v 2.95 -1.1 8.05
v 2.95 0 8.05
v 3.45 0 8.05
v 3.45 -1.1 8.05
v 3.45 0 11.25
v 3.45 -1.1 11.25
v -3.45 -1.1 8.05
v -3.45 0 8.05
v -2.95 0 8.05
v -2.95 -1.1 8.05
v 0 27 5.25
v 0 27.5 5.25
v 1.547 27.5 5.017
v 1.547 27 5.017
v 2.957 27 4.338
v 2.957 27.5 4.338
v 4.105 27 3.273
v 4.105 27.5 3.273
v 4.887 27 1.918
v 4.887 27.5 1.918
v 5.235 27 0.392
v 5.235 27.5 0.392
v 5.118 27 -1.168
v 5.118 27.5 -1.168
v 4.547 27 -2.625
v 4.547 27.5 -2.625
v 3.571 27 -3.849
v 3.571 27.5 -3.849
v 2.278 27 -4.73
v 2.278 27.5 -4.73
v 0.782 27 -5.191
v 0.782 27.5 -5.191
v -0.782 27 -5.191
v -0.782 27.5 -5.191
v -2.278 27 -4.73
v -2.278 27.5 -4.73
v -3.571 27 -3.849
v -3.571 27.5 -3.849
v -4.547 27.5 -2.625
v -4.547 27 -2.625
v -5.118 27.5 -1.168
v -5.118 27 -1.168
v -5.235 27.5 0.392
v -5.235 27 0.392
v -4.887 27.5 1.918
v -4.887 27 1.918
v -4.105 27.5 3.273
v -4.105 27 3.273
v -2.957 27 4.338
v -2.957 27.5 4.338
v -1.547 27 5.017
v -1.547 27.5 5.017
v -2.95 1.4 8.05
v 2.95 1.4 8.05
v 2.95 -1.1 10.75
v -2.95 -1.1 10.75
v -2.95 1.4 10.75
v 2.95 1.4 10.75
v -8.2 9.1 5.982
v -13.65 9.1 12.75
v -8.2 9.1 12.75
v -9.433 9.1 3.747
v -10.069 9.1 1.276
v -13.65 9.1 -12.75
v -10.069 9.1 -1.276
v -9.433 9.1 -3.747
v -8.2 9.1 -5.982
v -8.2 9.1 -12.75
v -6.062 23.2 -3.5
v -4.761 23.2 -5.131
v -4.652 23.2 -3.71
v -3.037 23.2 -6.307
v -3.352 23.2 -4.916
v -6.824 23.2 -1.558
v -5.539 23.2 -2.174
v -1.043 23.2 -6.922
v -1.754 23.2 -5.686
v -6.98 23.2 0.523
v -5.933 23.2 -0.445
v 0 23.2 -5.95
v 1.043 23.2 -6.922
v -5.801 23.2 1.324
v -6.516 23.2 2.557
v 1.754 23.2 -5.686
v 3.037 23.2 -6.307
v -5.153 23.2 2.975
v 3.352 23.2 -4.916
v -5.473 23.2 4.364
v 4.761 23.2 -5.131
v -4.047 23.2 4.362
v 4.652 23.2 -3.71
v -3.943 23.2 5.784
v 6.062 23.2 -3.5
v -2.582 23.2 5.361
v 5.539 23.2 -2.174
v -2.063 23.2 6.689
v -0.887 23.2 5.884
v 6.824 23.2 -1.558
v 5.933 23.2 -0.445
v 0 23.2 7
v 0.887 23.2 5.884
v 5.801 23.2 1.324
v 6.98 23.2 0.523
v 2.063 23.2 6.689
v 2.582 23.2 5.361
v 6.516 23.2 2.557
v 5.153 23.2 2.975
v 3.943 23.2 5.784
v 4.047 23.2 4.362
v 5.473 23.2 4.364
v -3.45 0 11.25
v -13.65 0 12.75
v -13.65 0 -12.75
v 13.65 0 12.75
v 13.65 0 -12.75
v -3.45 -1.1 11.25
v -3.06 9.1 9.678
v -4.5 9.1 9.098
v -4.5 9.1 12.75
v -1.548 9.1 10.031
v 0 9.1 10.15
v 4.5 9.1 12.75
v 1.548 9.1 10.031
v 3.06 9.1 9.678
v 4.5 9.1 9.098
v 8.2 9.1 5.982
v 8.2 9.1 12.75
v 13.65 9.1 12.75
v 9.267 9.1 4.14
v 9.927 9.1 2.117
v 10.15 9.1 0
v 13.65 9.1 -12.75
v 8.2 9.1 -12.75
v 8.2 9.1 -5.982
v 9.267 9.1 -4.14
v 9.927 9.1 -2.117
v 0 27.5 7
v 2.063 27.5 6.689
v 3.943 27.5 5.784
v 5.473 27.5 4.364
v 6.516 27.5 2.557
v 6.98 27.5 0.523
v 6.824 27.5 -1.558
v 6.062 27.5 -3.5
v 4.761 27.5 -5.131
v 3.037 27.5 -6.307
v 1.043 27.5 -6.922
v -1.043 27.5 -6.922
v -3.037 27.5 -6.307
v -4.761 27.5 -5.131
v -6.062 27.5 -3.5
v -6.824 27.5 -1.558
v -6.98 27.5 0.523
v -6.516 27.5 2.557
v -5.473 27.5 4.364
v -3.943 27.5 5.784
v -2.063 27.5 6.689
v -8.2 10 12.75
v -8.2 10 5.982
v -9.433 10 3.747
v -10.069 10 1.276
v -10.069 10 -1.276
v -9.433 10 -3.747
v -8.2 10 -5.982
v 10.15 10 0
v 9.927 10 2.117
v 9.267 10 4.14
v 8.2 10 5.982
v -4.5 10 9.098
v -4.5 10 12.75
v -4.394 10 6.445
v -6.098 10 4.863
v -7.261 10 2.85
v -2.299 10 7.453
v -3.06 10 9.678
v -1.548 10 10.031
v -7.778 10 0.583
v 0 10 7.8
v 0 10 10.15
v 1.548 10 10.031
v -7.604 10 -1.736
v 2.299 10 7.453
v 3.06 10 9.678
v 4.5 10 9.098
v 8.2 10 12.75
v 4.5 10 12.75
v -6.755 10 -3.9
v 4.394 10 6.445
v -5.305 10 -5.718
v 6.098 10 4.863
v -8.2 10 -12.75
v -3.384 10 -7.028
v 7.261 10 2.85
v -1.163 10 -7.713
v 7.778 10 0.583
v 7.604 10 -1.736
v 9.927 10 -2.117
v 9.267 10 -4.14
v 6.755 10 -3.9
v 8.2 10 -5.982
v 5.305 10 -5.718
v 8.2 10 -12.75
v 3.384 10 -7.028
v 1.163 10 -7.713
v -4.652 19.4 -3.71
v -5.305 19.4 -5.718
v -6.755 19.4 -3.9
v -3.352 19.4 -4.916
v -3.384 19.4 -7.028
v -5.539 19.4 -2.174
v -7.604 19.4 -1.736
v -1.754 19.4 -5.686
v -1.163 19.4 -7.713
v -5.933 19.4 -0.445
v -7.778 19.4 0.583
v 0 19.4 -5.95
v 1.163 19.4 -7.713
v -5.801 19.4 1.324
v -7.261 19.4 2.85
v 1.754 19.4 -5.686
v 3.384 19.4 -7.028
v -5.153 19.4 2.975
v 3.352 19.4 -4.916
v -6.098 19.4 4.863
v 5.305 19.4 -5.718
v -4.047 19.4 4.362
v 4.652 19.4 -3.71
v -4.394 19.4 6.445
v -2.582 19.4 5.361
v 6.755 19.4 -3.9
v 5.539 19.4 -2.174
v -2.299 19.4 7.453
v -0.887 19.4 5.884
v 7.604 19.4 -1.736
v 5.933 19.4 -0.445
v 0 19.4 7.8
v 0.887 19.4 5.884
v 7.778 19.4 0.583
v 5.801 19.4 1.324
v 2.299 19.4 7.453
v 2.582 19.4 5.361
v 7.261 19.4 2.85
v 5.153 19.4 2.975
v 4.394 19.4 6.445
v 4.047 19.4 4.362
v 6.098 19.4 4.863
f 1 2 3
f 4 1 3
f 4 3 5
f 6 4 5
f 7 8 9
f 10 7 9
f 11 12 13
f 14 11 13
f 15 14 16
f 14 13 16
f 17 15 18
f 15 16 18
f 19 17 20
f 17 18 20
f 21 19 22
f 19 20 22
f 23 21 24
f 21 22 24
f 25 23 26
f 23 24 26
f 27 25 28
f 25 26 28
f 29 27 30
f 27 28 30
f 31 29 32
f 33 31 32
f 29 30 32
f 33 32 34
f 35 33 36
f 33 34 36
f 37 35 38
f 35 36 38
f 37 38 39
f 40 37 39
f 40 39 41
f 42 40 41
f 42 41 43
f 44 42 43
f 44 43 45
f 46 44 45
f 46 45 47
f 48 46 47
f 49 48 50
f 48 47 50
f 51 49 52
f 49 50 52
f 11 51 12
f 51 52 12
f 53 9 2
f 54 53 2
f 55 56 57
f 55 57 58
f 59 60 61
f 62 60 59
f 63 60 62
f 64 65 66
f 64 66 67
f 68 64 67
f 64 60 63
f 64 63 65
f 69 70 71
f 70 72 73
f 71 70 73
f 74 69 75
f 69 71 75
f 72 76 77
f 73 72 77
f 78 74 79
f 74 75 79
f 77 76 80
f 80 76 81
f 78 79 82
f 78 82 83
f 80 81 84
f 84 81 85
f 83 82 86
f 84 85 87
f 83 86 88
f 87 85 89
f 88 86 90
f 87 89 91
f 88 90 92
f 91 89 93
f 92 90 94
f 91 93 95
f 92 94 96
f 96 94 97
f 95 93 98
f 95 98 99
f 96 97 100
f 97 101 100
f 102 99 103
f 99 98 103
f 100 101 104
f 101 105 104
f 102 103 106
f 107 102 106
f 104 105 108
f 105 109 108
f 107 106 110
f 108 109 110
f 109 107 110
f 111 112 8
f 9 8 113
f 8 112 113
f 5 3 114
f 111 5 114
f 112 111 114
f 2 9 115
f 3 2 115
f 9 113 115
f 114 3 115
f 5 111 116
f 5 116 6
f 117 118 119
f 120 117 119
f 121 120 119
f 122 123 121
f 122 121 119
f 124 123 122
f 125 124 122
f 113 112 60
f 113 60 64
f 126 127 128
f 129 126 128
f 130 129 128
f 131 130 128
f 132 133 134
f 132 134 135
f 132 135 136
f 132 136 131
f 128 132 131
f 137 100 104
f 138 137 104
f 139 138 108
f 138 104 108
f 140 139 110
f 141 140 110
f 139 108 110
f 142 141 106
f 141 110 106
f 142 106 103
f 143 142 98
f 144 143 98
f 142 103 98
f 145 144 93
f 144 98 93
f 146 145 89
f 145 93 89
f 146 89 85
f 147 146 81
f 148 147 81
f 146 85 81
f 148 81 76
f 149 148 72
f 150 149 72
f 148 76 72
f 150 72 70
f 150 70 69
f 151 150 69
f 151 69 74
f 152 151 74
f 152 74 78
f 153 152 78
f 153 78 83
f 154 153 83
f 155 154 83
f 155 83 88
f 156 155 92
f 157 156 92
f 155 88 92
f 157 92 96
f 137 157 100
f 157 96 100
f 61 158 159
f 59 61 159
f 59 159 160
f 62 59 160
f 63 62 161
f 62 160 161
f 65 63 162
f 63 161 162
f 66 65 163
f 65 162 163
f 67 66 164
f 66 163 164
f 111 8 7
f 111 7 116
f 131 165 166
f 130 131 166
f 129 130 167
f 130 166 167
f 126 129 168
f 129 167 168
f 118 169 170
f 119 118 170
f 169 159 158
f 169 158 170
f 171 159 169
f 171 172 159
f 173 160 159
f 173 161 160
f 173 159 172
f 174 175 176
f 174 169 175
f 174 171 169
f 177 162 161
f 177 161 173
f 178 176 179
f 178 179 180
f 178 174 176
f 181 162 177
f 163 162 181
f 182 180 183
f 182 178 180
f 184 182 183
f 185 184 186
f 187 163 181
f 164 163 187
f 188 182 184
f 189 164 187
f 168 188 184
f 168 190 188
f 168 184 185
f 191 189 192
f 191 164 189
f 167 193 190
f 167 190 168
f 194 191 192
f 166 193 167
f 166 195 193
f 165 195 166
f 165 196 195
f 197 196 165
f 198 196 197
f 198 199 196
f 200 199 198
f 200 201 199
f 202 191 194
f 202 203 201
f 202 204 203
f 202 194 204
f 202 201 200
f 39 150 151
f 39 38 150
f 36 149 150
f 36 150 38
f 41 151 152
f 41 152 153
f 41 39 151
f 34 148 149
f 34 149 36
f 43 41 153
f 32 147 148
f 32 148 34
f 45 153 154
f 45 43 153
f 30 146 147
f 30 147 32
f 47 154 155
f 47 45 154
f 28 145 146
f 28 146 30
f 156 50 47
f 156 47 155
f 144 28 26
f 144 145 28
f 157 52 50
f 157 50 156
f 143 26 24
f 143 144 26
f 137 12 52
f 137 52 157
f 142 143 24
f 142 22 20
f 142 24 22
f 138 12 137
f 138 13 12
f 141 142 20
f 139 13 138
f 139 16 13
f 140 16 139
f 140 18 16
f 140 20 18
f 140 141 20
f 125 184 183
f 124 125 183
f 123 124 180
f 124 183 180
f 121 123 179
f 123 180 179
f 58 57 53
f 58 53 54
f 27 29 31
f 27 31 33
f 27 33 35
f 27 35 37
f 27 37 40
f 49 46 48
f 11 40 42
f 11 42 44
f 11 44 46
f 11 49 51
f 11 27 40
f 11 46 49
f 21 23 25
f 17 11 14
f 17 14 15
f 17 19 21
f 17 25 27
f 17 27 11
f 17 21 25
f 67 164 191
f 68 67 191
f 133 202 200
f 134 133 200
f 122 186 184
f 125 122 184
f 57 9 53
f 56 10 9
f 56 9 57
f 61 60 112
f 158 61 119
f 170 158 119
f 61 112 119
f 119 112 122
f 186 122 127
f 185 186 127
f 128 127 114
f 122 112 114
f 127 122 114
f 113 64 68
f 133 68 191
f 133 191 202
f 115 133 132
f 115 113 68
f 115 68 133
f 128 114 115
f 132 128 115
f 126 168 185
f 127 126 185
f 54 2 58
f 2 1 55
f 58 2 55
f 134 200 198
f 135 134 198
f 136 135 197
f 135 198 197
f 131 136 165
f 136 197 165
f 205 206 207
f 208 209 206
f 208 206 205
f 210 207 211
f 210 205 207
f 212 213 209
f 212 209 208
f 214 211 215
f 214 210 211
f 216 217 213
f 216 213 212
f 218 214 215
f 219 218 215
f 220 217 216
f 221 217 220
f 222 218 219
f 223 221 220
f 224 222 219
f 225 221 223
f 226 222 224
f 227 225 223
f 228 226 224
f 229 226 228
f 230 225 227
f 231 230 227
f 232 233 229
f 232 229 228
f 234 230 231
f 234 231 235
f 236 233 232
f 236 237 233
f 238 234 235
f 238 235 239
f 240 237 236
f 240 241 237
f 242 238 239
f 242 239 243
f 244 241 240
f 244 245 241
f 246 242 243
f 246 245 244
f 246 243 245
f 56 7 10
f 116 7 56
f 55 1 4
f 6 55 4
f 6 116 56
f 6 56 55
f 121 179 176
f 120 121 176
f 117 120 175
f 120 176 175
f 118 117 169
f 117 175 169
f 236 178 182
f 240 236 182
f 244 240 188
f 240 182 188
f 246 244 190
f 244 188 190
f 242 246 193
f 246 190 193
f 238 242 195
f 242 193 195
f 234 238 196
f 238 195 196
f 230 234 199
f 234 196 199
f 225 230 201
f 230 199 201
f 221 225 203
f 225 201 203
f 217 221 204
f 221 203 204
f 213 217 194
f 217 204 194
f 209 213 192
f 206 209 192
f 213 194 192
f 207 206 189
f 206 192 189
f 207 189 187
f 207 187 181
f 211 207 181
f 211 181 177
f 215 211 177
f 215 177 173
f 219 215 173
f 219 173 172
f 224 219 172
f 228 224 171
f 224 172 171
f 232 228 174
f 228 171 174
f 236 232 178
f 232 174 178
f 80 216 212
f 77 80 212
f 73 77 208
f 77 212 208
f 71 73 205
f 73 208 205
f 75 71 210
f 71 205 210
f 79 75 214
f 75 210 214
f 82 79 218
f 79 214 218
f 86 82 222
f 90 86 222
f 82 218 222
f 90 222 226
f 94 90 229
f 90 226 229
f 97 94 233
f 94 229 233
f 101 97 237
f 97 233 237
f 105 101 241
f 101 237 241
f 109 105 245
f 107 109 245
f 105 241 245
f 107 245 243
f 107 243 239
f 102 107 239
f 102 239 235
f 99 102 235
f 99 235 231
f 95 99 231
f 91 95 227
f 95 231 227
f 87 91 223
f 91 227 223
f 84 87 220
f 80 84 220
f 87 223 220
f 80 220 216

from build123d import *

# Parameters (mm, degrees)
SKETCH1_W           = 27.3
SKETCH1_H           = 25.5
BOSS_EXTRUDE1_DEPTH = 10
CUT_EXTRUDE1_DEPTH  = 0.9
SKETCH3_R           = 7.8
BOSS_EXTRUDE2_DEPTH = 9.4
SKETCH4_R           = 5.95
BOSS_EXTRUDE3_DEPTH = 3.8
SKETCH5_R           = 7
BOSS_EXTRUDE4_DEPTH = 4.3
SKETCH6_R           = 5.25
CUT_EXTRUDE2_DEPTH  = 0.5
SKETCH7_W           = 6.9
SKETCH7_H           = 3.2
BOSS_EXTRUDE5_DEPTH = 1.1
SKETCH8_W           = 5.9
SKETCH8_H           = 2.7
CUT_EXTRUDE3_DEPTH  = 2.5


with BuildPart() as part:
    # Sketch1 → Boss-Extrude1 (new body)
    with BuildSketch(Plane(origin=(0, 0, 0), x_dir=(1, 0, 0), z_dir=(0, 1, 0))):
        Rectangle(SKETCH1_W, SKETCH1_H)
    extrude(amount=BOSS_EXTRUDE1_DEPTH)

    # Sketch2 → Cut-Extrude1 (cut)
    with BuildSketch(Plane(origin=(0, 10, 0), x_dir=(1, 0, 0), z_dir=(0, 1, 0))):
        with BuildLine():
            Line((-8.2, 5.981847541), (-8.2, 12.75))
            Line((-8.2, 12.75), (-13.65, 12.75))
            Line((-13.65, 12.75), (-13.65, -12.75))
            Line((-13.65, -12.75), (-8.2, -12.75))
            Line((-8.2, -12.75), (-8.2, -5.981847541))
            ThreePointArc((-8.2, -5.981847541), (-10.15, 0), (-8.2, 5.981847541))
        make_face()
        with BuildLine():
            Line((13.65, 12.75), (8.2, 12.75))
            Line((8.2, 12.75), (8.2, 5.981847541))
            ThreePointArc((8.2, 5.981847541), (9.650194299, 3.145830574), (10.15, 0))
            ThreePointArc((10.15, 0), (9.650194299, -3.145830574), (8.2, -5.981847541))
            Line((8.2, -5.981847541), (8.2, -12.75))
            Line((8.2, -12.75), (13.65, -12.75))
            Line((13.65, -12.75), (13.65, 12.75))
        make_face()
        with BuildLine():
            ThreePointArc((0, -10.15), (-2.310672611, -9.883485827), (-4.5, -9.097939327))
            Line((-4.5, -9.097939327), (-4.5, -12.75))
            Line((-4.5, -12.75), (0, -12.75))
            Line((0, -12.75), (0, -10.15))
        make_face()
        with BuildLine():
            ThreePointArc((4.5, -9.097939327), (2.310672611, -9.883485827), (0, -10.15))
            Line((0, -10.15), (0, -12.75))
            Line((0, -12.75), (4.5, -12.75))
            Line((4.5, -12.75), (4.5, -9.097939327))
        make_face()
    extrude(amount=-CUT_EXTRUDE1_DEPTH, mode=Mode.SUBTRACT)

    # Sketch3 → Boss-Extrude2 (add)
    with BuildSketch(Plane(origin=(0, 10, 0), x_dir=(1, 0, 0), z_dir=(0, 1, 0))):
        with Locations(Location((0, 0, 0), (0, 0, 270))):
            Circle(SKETCH3_R)
    extrude(amount=BOSS_EXTRUDE2_DEPTH)

    # Sketch4 → Boss-Extrude3 (add)
    with BuildSketch(Plane(origin=(0, 19.4, 0), x_dir=(1, 0, 0), z_dir=(0, 1, 0))):
        with Locations(Location((0, 0, 0), (0, 0, 90))):
            Circle(SKETCH4_R)
    extrude(amount=BOSS_EXTRUDE3_DEPTH)

    # Sketch5 → Boss-Extrude4 (add)
    with BuildSketch(Plane(origin=(0, 23.2, 0), x_dir=(1, 0, 0), z_dir=(0, 1, 0))):
        with Locations(Location((0, 0, 0), (0, 0, 270))):
            Circle(SKETCH5_R)
    extrude(amount=BOSS_EXTRUDE4_DEPTH)

    # Sketch6 → Cut-Extrude2 (cut)
    with BuildSketch(Plane(origin=(0, 27.5, 0), x_dir=(1, 0, 0), z_dir=(0, 1, 0))):
        with Locations(Location((0, 0, 0), (0, 0, 270))):
            Circle(SKETCH6_R)
    extrude(amount=-CUT_EXTRUDE2_DEPTH, mode=Mode.SUBTRACT)

    # Sketch7 → Boss-Extrude5 (add)
    with BuildSketch(Plane.XZ):
        with Locations((0, 9.65)):
            Rectangle(SKETCH7_W, SKETCH7_H)
    extrude(amount=BOSS_EXTRUDE5_DEPTH)

    # Sketch8 → Cut-Extrude3 (cut)
    with BuildSketch(Plane.XZ.offset(1.1)):
        with Locations((0, 9.4)):
            Rectangle(SKETCH8_W, SKETCH8_H)
    extrude(amount=-CUT_EXTRUDE3_DEPTH, mode=Mode.SUBTRACT)


solid = part.part
